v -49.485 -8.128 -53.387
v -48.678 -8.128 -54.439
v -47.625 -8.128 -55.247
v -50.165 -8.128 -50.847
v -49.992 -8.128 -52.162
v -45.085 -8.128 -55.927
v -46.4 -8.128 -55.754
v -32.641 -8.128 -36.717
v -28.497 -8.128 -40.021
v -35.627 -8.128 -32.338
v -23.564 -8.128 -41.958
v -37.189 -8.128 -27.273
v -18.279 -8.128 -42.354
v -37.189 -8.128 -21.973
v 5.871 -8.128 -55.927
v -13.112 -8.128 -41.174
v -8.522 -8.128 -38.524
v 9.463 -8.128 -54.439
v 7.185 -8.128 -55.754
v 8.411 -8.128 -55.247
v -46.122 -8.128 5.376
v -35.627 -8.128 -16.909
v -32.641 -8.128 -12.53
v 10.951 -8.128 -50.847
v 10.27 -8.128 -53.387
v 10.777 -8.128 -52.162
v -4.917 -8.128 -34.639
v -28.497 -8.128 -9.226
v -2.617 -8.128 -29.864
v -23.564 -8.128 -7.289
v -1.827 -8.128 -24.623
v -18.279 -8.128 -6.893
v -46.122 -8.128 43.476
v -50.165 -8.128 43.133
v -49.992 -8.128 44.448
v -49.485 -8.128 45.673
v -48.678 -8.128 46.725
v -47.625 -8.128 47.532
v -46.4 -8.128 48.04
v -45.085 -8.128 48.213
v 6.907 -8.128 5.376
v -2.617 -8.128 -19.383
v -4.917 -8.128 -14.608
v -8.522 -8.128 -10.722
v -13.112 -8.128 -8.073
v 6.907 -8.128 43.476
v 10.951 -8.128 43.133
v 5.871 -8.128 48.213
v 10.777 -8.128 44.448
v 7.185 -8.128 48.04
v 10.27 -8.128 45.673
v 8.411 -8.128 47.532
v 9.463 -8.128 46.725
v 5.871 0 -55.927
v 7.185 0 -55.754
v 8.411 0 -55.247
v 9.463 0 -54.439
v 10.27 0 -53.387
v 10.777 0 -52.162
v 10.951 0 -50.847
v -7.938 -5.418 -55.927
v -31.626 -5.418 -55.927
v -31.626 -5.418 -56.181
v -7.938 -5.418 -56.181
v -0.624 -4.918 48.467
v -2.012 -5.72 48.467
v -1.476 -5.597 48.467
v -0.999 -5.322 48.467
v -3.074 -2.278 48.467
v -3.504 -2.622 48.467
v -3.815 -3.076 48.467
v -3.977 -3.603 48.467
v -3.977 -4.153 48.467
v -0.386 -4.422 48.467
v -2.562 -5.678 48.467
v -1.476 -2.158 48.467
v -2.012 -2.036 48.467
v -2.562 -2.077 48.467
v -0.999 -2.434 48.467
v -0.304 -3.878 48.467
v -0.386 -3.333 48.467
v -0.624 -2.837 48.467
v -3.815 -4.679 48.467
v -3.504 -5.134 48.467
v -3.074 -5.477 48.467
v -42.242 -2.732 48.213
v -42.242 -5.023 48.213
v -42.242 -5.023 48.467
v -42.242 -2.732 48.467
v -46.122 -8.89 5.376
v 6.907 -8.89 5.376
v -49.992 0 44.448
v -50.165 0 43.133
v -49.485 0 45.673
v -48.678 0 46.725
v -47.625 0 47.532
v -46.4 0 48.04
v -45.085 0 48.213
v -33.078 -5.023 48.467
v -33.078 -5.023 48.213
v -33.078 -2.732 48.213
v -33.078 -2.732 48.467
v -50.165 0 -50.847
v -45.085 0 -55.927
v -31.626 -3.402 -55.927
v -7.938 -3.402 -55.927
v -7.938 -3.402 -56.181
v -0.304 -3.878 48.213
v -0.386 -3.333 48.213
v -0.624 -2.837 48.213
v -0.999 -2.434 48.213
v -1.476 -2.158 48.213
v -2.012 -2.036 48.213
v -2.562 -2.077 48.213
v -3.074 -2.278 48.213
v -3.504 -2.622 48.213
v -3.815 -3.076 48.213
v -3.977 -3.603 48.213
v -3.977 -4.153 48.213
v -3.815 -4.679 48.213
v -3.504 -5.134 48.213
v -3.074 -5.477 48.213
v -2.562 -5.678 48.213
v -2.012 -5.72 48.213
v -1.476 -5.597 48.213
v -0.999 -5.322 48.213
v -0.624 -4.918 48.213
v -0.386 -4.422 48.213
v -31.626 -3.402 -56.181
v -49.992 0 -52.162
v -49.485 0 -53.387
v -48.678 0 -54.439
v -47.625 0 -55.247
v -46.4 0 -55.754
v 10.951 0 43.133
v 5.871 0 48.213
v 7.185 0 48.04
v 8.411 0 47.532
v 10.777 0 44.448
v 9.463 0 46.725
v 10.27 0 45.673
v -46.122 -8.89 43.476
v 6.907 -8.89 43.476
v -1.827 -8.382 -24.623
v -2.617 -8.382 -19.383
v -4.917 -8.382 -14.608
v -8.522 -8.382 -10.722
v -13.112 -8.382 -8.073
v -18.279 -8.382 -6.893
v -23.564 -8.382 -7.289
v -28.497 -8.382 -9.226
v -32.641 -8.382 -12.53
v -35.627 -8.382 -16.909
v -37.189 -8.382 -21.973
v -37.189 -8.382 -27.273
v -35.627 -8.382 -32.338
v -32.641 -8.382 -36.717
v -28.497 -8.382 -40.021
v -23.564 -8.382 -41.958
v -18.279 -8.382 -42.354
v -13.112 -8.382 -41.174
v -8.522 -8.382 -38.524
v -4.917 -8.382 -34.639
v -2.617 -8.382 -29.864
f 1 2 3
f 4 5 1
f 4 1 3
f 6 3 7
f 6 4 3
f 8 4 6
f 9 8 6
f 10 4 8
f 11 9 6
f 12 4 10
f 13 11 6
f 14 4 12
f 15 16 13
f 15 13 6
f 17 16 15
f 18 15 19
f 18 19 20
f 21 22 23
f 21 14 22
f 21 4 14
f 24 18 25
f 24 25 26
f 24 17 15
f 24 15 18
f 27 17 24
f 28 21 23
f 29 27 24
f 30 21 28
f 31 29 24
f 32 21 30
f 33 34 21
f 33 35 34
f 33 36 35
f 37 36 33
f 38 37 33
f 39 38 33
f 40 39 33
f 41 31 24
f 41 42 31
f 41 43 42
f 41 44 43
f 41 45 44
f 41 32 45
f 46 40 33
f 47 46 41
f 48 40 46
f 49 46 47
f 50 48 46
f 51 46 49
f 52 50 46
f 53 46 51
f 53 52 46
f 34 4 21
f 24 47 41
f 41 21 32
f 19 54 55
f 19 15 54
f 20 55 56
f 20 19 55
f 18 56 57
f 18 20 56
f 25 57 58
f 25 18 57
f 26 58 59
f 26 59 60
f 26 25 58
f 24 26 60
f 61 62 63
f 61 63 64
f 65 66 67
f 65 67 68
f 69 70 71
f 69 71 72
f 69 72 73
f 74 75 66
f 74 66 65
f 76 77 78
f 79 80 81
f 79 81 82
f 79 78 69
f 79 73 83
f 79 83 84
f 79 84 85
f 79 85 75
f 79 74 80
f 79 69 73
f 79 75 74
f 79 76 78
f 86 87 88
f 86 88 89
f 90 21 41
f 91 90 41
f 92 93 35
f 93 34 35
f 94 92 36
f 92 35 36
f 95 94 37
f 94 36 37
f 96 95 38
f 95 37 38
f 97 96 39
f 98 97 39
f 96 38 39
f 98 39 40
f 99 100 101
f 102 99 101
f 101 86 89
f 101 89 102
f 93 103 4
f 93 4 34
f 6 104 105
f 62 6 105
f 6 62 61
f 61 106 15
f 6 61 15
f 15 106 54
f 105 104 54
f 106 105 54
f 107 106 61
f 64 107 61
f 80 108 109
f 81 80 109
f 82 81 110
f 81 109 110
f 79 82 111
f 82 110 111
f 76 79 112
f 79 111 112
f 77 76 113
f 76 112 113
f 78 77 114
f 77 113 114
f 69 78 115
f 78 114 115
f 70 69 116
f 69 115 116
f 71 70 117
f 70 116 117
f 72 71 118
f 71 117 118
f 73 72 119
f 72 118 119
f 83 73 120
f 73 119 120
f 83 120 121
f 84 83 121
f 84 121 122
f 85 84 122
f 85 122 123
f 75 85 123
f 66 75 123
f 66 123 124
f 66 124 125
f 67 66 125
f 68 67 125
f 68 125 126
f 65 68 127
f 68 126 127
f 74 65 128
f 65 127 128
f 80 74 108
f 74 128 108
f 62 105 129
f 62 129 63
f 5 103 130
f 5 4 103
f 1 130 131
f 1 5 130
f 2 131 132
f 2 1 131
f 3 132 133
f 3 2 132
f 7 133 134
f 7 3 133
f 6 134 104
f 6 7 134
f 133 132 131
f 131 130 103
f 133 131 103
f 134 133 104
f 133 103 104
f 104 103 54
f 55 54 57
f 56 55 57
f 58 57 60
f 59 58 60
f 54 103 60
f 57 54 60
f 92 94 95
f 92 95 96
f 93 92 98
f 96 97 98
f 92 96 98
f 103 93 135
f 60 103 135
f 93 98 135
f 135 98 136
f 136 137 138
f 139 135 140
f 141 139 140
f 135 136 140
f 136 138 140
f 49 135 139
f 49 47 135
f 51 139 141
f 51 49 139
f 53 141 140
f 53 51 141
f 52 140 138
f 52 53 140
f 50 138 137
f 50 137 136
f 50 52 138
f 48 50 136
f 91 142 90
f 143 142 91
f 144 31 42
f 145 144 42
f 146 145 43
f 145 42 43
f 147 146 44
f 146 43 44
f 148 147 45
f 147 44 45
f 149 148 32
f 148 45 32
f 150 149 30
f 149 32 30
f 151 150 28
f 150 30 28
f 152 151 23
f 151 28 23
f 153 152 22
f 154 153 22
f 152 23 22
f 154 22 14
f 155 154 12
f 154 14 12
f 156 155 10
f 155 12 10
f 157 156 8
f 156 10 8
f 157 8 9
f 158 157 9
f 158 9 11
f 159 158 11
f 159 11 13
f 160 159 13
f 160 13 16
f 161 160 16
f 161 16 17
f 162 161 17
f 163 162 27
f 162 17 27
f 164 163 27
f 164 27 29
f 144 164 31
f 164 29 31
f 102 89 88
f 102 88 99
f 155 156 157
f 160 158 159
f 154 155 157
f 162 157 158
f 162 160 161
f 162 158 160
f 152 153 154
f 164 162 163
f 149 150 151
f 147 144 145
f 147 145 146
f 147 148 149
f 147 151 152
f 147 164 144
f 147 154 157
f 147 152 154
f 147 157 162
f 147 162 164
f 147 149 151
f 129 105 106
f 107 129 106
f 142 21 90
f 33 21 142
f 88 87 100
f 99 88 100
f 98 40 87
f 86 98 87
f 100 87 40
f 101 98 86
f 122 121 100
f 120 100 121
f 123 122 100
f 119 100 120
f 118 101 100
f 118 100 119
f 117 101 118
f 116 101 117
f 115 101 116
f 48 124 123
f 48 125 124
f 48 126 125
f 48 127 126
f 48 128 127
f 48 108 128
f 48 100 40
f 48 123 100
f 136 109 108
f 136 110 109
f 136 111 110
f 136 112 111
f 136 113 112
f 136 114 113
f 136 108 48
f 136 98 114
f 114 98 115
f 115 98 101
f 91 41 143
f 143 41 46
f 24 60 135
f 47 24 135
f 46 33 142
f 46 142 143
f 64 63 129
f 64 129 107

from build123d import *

# Parameters (mm, degrees)
F0_W      = 61.1160316085
F0_H      = 104.14
F1_DEPTH  = 8.128
F2_R      = 5.08
F4_W      = 9.1636627913
F4_H      = 2.2909147665
F4_R      = 1.8469945904
F5_DEPTH  = 0.254
F6_W      = 23.6879978329
F6_H      = 2.015999984
F7_DEPTH  = 0.254
F3_W      = 53.0287652906
F3_H      = 38.1
F8_DEPTH  = 0.762
F3_R      = 7.62
F9_DEPTH  = 0.254
F3_R_2    = 17.78
F10_DEPTH = 0.254


# Not quite as in the source:
# - the program builds the solid bodies; features that only make, move or delete a surface that nothing else refers to are left out


with BuildPart() as f1:
    # F0 (on Front) → F1 (new body)
    with BuildSketch(Plane.XZ):
        with Locations((-19.607455004, -3.8571991026)):
            Rectangle(F0_W, F0_H)
    extrude(amount=F1_DEPTH)

    # F2
    f2_edges = [f1.edges().sort_by_distance(p)[0] for p in [
        (10.950561, -4.064, 48.212801),
        (-50.165471, -4.064, 48.212801),
        (10.950561, -4.064, -55.927199),
        (-50.165471, -4.064, -55.927199),
    ]]
    fillet(f2_edges, radius=F2_R)

    # F4 (on face) → F5 (join)
    with BuildSketch(Plane.XY.offset(48.2128008974)):
        with Locations((-37.6597046852, -3.8777994923)):
            Rectangle(F4_W, F4_H)
        with Locations((-2.1505255718, -3.8777994923)):
            Circle(F4_R)
    extrude(amount=F5_DEPTH)

    # F6 (on face) → F7 (join)
    with BuildSketch(Plane(origin=(0, 0, -55.9271991026), x_dir=(1, 0, 0), z_dir=(0, 0, -1))):
        with Locations((-19.78199929, 4.4100000523)):
            Rectangle(F6_W, F6_H)
    extrude(amount=F7_DEPTH)

    # F3 (on face) → F8 (join)
    with BuildSketch(Plane.XZ.offset(8.128)):
        with Locations((-19.607455004, 24.4255777958)):
            Rectangle(F3_W, F3_H)
    extrude(amount=F8_DEPTH)

    # F3 (on face) → F9 (join)
    with BuildSketch(Plane.XZ.offset(8.128)):
        with Locations((-19.607455004, -24.6234625244)):
            Circle(F3_R)
    extrude(amount=F9_DEPTH)

    # F3 (on face) → F10 (join)
    with BuildSketch(Plane.XZ.offset(8.128)):
        with Locations((-19.607455004, -24.6234625244)):
            Circle(F3_R_2)
        with Locations((-19.607455004, -24.6234625244)):
            Circle(F3_R, mode=Mode.SUBTRACT)
    extrude(amount=F10_DEPTH)


solid = f1.part
